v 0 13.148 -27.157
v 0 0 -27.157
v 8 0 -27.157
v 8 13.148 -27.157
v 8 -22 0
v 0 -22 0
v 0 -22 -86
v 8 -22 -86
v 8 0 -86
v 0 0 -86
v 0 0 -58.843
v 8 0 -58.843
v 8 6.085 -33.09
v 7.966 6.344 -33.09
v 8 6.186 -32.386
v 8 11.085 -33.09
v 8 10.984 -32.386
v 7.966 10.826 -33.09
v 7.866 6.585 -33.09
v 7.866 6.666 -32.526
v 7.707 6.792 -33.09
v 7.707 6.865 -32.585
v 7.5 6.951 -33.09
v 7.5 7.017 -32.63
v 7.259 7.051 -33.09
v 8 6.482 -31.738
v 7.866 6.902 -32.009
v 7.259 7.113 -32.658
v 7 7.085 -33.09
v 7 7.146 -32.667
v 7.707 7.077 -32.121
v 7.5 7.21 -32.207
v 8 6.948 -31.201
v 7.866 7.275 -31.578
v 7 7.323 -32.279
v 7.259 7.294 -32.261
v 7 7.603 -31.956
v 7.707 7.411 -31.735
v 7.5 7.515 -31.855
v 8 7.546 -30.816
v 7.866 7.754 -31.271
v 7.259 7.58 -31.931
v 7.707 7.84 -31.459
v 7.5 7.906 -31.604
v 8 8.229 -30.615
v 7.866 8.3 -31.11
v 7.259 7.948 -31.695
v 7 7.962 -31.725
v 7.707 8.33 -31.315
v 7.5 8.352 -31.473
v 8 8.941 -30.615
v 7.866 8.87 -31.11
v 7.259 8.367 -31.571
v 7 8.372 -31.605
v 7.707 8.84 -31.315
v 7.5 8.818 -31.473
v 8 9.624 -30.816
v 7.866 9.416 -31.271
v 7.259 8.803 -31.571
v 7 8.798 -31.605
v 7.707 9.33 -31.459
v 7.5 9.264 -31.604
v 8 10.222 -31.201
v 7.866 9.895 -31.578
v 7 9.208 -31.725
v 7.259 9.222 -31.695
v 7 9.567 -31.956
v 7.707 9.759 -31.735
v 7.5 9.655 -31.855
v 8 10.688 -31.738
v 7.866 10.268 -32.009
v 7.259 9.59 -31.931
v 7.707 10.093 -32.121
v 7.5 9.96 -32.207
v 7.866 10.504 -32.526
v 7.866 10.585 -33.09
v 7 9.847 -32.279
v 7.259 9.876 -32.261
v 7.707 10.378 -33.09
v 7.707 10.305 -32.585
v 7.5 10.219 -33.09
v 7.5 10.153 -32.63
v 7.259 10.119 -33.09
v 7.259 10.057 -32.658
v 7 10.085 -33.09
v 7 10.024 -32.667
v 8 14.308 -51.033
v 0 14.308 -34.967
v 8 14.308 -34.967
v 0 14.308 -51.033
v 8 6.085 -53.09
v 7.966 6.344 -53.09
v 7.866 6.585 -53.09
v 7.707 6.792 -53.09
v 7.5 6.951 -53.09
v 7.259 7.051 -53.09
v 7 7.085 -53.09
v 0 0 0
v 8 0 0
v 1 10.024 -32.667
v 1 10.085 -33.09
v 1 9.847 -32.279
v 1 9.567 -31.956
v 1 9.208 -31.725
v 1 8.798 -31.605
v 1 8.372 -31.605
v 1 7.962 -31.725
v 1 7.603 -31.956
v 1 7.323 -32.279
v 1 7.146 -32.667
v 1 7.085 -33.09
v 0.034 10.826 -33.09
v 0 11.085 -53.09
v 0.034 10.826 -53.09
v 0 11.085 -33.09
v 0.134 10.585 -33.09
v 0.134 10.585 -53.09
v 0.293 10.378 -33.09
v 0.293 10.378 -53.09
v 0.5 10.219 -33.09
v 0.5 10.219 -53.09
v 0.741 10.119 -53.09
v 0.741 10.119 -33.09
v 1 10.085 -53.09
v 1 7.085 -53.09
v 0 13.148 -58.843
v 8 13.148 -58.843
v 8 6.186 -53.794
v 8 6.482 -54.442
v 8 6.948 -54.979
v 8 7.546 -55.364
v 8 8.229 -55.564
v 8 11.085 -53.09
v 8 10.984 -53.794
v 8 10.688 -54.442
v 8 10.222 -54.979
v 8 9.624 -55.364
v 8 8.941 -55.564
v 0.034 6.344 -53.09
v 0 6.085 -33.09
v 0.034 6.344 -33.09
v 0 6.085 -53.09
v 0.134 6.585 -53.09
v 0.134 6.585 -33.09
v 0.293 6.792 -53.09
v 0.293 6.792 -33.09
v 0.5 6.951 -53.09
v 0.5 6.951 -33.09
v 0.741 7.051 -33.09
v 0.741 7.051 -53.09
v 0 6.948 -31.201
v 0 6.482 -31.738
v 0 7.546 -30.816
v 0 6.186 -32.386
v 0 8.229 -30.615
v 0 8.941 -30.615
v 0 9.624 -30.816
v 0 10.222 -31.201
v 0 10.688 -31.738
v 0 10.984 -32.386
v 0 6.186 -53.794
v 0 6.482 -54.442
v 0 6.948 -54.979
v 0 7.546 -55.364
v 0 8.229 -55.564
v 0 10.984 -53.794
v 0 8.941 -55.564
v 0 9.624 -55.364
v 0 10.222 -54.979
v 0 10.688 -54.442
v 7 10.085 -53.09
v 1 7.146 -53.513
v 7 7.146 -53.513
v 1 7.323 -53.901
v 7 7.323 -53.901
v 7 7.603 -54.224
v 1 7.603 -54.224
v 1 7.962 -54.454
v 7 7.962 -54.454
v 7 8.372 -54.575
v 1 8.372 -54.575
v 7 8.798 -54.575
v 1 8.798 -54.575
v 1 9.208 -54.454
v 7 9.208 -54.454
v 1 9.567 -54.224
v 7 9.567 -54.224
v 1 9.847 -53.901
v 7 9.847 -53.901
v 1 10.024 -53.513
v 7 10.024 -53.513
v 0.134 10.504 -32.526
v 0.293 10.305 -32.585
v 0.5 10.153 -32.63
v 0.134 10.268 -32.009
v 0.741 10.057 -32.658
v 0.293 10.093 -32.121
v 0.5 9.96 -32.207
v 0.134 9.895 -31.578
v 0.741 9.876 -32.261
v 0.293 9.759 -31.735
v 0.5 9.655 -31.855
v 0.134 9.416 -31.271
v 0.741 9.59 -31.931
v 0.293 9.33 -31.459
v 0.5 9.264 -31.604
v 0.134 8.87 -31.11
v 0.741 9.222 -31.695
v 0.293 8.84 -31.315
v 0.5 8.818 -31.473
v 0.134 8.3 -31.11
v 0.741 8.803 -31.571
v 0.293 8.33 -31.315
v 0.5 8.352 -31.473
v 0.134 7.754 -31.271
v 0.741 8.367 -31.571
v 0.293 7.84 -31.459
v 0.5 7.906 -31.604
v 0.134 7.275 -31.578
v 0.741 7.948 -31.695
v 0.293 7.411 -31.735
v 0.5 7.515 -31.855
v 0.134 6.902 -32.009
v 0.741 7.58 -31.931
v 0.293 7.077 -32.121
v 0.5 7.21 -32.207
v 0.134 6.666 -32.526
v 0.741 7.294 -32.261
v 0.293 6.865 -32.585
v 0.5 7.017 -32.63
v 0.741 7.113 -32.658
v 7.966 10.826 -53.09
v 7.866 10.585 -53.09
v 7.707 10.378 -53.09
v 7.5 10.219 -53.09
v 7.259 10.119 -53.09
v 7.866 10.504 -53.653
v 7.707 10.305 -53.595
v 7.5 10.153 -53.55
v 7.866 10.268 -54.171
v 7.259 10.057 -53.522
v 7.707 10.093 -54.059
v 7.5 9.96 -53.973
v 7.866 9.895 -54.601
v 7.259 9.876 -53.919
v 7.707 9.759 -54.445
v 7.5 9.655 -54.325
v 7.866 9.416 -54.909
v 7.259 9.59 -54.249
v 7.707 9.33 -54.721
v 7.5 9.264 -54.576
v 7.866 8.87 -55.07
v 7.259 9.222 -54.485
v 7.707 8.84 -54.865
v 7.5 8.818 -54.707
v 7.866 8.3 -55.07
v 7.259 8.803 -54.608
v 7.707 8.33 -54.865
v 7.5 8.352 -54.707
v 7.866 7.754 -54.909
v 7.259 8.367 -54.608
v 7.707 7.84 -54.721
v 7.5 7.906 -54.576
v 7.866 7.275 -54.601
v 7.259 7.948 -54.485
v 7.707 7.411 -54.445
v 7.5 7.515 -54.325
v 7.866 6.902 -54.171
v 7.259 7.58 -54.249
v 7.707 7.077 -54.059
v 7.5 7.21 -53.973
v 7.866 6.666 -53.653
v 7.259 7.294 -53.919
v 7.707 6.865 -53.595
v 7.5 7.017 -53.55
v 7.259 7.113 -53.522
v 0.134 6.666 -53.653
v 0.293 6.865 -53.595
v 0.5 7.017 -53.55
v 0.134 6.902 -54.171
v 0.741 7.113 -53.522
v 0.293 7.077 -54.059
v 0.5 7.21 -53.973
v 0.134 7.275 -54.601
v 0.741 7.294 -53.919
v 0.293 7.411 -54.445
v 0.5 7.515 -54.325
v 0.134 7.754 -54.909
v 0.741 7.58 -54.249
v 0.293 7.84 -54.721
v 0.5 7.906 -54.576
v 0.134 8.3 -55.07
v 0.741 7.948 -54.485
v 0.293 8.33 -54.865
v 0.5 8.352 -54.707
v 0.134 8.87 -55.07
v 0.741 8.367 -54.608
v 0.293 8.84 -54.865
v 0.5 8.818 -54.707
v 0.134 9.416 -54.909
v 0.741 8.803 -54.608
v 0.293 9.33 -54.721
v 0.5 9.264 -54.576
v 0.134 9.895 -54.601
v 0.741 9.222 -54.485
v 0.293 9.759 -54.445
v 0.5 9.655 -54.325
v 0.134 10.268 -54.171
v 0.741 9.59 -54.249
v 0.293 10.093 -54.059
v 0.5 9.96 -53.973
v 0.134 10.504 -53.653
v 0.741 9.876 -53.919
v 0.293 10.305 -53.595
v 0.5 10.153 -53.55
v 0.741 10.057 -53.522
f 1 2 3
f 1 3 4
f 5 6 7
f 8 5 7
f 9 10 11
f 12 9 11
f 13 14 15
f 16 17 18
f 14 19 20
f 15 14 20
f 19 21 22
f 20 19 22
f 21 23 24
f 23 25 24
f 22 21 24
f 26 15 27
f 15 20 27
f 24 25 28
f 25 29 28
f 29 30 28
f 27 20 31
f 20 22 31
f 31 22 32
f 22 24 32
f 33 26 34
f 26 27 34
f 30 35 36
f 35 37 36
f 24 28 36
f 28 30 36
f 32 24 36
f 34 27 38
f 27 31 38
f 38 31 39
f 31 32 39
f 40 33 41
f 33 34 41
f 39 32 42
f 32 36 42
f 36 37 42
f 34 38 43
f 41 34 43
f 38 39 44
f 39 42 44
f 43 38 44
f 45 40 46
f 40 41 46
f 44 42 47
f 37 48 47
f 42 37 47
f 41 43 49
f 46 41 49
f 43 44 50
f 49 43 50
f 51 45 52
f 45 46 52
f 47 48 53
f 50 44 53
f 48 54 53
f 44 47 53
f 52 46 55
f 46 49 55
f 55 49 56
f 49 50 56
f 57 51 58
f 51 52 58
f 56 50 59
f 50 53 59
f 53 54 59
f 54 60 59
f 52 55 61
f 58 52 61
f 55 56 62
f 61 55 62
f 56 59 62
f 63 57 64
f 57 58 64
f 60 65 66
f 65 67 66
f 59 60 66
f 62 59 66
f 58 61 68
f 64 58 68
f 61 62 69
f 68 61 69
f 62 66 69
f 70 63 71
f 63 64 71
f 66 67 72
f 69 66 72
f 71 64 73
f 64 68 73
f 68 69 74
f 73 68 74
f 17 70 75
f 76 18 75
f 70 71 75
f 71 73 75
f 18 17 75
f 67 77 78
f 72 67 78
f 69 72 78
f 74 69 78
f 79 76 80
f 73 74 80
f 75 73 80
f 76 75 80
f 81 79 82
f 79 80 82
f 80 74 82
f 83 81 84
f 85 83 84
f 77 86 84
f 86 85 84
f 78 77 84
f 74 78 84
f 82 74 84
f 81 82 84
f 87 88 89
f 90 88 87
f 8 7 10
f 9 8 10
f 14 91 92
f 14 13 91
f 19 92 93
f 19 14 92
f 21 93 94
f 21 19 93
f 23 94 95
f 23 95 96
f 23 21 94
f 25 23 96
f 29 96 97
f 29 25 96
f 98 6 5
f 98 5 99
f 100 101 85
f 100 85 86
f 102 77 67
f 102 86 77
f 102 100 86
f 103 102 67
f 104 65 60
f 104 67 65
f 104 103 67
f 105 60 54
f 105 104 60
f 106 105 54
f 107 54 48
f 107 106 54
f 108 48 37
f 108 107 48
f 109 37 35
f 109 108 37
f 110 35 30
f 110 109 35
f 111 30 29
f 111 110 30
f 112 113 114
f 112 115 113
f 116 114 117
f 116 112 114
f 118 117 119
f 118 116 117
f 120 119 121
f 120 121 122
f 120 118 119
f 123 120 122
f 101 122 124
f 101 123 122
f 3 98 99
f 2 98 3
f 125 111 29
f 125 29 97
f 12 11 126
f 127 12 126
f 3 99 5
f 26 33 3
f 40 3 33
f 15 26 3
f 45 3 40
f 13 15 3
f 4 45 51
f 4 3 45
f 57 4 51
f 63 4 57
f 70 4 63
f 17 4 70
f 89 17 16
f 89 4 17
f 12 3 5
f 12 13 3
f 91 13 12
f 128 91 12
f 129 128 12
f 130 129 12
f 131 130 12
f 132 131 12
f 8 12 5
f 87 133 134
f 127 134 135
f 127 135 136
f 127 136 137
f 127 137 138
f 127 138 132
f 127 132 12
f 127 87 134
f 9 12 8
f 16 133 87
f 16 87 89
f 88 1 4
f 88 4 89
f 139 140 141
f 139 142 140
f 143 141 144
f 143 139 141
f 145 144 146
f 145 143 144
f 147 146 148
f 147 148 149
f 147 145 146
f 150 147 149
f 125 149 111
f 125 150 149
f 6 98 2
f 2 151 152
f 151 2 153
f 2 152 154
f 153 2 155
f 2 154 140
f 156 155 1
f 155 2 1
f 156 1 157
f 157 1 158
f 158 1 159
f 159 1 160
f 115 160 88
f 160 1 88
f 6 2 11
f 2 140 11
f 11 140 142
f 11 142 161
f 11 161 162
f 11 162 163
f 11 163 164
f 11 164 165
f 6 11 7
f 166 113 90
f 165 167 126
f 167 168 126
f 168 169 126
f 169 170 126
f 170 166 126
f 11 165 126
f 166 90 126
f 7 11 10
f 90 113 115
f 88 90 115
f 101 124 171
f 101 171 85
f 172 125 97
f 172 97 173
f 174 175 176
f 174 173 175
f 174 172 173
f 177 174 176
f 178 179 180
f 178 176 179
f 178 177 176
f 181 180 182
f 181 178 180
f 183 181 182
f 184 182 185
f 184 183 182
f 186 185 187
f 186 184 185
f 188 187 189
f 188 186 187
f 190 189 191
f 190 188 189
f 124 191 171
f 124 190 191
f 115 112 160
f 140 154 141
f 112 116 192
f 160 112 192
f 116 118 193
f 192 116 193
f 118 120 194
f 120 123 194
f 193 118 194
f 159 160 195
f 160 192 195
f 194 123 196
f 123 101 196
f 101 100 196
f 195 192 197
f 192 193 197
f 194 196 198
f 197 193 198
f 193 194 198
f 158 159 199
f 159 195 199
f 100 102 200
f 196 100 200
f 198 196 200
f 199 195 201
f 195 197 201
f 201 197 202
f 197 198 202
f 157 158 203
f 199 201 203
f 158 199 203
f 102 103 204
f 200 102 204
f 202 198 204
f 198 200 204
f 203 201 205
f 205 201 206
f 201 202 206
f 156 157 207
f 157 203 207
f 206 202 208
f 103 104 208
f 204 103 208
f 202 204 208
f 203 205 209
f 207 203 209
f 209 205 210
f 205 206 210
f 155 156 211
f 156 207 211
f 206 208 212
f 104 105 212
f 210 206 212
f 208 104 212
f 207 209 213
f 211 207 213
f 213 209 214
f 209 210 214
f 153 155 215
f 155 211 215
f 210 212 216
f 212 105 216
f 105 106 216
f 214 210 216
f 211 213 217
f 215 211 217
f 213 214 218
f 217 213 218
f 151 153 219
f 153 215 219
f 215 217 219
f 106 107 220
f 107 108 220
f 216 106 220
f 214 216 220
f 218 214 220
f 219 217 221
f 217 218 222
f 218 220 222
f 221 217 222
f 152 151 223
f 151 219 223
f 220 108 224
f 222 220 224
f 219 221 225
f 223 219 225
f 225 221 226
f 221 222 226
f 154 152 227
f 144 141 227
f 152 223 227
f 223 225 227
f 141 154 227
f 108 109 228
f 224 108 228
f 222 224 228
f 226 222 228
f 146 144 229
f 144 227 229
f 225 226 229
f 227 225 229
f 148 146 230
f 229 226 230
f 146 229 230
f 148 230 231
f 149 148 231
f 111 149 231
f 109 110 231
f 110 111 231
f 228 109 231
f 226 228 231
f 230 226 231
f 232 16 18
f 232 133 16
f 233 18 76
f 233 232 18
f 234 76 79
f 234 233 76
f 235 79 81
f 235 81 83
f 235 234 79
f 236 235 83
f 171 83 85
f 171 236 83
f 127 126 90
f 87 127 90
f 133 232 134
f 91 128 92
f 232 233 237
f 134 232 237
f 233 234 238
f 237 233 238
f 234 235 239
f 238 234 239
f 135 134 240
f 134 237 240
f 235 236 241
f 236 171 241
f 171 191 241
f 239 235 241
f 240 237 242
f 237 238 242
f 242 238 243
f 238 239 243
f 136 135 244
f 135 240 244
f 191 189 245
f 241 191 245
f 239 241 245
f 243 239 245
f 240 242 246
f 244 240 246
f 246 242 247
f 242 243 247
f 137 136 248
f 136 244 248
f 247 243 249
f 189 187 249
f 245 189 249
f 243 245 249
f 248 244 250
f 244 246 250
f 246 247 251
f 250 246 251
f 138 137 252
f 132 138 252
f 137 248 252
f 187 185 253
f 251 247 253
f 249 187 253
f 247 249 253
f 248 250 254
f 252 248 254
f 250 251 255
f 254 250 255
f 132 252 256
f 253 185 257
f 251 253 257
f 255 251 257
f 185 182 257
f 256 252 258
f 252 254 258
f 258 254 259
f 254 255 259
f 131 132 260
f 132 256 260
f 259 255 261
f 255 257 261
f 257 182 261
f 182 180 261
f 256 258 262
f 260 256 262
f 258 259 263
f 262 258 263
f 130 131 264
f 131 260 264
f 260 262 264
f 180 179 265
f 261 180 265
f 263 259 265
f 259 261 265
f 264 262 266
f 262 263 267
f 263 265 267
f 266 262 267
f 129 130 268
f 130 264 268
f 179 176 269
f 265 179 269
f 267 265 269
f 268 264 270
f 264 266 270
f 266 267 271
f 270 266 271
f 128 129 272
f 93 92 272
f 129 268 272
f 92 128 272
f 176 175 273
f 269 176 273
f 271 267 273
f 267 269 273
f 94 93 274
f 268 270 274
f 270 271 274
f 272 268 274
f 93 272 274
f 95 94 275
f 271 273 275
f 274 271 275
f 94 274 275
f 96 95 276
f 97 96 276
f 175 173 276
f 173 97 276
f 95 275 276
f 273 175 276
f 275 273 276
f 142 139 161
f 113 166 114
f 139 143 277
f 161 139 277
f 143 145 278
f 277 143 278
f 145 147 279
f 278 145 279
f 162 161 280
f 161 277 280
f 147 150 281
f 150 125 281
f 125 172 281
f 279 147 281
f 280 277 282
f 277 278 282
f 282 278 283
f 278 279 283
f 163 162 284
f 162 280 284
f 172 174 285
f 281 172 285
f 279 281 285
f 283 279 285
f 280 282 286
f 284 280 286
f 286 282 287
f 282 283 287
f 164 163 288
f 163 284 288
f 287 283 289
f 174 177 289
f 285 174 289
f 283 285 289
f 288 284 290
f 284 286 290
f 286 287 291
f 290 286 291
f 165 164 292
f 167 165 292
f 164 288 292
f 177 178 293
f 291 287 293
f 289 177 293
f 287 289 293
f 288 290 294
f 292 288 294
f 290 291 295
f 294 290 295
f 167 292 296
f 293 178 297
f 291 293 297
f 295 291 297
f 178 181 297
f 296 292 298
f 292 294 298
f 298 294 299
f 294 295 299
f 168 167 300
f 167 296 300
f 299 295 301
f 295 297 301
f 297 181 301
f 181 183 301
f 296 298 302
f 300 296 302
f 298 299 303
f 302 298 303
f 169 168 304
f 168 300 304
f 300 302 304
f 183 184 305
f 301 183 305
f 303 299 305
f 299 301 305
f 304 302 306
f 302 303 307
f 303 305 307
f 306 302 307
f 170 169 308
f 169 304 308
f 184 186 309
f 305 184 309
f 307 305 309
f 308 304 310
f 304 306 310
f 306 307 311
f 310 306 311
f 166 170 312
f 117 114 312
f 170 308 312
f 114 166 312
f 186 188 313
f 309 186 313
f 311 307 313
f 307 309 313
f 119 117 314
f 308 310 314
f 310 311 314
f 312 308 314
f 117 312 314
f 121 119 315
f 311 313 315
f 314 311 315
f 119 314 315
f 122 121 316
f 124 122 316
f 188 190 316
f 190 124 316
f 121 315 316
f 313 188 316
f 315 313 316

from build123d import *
from OCP.BRepAlgoAPI import BRepAlgoAPI_Cut
from OCP.TopTools import TopTools_ListOfShape

# Parameters (mm, degrees)
SKETCH_1_W          = 86
SKETCH_1_H          = 44.920858062
EXTRUDE_1_DEPTH     = 8
CUT_EXTRUDE_2_DEPTH = 92.635829898
CUT_EXTRUDE_3_DEPTH = 90.129115951
FILLET_1_R          = 1


with BuildPart() as part:
    # Эскиз1 → Вытянуть1 (new body)
    with BuildSketch(Plane(origin=(0, 0, 0), x_dir=(0, 0, -1), z_dir=(1, 0, 0))):
        with Locations((43, -8.152073661)):
            Rectangle(SKETCH_1_W, SKETCH_1_H)
    extrude(amount=EXTRUDE_1_DEPTH)


with BuildPart() as cut_extrude_2_tool:
    # Эскиз3 → Вырез-Вытянуть2 (new, through all)
    with BuildSketch(Plane.ZY):
        Polygon((0, -30.612502692), (-2.2e-07, -21.999984323), (-86, -21.999984323), (-86, -30.612502692), align=None)
        Polygon((0, 14.387497308), (-3.68e-07, 0), (-27.157261974, 0), (-27.157261974, 13.148042163), (-35.5, 14.387497308), align=None)
        Polygon((-58.842738026, 0), (-58.842738026, 13.148042163), (-50.5, 14.387497308), (-86, 14.387497308), (-85.999999632, 0), align=None)
    extrude(amount=-CUT_EXTRUDE_2_DEPTH)


with BuildPart() as part_1:
    add(part.part)

    # Вырез-Вытянуть2: cut by cut_extrude_2_tool, with a tolerance
    cut_extrude_2_stock = TopTools_ListOfShape()
    cut_extrude_2_stock.Append(part_1.part.wrapped)
    cut_extrude_2_tools = TopTools_ListOfShape()
    cut_extrude_2_tools.Append(cut_extrude_2_tool.part.wrapped)
    cut_extrude_2_cut = BRepAlgoAPI_Cut()
    cut_extrude_2_cut.SetArguments(cut_extrude_2_stock)
    cut_extrude_2_cut.SetTools(cut_extrude_2_tools)
    cut_extrude_2_cut.SetFuzzyValue(0.00001)
    cut_extrude_2_cut.Build()
    add(Compound.cast(cut_extrude_2_cut.Shape()).solids(), mode=Mode.REPLACE)

    # Эскиз4 → Вырез-Вытянуть3 (cut, through all)
    with BuildSketch(Plane.ZY):
        with BuildLine():
            Line((-53.089945506, 10.085003592), (-33.089945506, 10.085003592))
            ThreePointArc((-33.089945506, 10.085003592), (-31.589945506, 8.585003592), (-33.089945506, 7.085003592))
            Line((-33.089945506, 7.085003592), (-53.089945506, 7.085003592))
            ThreePointArc((-53.089945506, 7.085003592), (-54.589945506, 8.585003592), (-53.089945506, 10.085003592))
        make_face()
    extrude(amount=-CUT_EXTRUDE_3_DEPTH, mode=Mode.SUBTRACT)

    # Скругление1
    fillet_1_edges = [part_1.edges().sort_by_distance(p)[0] for p in [
        (8, 8.585003592, -54.589945506),
        (8, 10.085003592, -43.089945506),
        (8, 8.585003592, -31.589945506),
        (8, 7.085003592, -43.089945506),
        (0, 8.585003592, -54.589945506),
        (0, 7.085003592, -43.089945506),
        (0, 8.585003592, -31.589945506),
        (0, 10.085003592, -43.089945506),
    ]]
    fillet(fillet_1_edges, radius=FILLET_1_R)


solid = part_1.part
